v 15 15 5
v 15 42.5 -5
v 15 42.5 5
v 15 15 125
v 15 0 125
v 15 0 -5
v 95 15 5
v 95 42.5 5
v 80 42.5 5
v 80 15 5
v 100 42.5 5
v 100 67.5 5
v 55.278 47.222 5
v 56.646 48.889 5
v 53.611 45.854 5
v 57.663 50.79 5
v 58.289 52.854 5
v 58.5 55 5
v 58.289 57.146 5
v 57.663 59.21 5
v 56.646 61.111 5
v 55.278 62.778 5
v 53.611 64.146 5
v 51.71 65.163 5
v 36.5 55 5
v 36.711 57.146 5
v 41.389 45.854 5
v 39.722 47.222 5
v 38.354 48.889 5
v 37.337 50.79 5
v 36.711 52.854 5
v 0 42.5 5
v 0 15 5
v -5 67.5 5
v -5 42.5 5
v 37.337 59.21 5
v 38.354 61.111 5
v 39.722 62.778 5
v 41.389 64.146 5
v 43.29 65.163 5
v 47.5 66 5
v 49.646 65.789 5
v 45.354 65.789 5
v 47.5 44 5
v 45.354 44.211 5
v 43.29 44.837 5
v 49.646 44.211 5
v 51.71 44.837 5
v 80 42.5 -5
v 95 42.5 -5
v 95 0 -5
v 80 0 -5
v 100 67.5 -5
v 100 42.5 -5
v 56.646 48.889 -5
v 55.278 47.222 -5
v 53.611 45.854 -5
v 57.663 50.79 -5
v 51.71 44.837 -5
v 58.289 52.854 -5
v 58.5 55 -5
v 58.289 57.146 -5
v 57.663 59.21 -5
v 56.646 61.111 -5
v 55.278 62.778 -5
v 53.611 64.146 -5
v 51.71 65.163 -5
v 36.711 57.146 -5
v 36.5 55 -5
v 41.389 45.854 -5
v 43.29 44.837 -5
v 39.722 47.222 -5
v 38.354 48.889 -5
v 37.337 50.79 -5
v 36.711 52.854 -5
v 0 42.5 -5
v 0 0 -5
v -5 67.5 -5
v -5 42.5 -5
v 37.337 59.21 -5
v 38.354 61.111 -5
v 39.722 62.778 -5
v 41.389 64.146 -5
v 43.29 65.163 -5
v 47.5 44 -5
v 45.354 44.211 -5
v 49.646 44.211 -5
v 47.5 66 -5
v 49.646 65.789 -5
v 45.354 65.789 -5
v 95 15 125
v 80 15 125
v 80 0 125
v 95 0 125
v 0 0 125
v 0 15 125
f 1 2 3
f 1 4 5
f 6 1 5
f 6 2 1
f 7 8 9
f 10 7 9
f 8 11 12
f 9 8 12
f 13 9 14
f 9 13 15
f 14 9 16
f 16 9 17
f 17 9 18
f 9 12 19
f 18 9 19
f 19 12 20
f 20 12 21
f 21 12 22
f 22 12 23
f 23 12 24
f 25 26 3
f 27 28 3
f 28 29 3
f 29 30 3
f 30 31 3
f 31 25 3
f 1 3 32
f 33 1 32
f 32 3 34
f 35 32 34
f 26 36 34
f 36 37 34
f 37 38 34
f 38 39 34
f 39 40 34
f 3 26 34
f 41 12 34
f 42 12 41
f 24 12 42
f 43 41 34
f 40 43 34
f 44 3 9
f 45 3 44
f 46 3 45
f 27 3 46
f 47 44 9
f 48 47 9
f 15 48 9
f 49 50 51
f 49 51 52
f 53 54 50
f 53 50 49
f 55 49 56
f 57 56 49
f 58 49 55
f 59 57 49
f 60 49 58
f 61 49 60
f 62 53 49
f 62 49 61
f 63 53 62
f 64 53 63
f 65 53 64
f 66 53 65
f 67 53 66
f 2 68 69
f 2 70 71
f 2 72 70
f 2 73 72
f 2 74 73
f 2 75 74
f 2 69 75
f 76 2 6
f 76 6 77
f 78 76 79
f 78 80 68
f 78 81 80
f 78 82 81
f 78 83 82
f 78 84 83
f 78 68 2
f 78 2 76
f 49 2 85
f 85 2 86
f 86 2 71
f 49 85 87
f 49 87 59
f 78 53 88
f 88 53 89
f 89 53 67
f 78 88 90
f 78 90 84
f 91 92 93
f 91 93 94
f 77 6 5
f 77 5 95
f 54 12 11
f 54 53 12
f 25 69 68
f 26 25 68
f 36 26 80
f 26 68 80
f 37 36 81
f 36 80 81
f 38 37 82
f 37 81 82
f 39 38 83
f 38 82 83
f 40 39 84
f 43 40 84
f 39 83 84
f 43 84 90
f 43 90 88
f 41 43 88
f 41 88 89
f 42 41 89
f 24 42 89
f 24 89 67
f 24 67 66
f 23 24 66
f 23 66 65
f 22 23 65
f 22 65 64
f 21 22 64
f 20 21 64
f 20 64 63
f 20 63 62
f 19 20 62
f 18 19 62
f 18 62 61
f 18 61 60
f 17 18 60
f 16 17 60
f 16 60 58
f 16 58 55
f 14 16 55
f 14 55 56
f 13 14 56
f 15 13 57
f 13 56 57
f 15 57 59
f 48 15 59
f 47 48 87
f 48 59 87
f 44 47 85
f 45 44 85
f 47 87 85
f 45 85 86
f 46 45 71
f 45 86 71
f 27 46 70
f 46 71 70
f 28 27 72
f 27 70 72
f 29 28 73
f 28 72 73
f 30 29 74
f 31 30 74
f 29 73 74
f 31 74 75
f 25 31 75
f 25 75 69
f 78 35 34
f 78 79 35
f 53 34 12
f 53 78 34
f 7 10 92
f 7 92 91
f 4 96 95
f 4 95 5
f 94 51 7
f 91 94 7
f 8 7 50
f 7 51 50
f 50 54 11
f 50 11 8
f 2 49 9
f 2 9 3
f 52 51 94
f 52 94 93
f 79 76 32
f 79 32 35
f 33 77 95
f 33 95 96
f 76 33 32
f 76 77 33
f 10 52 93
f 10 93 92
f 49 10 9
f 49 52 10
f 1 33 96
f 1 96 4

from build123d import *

# Parameters (mm, degrees)
IZIM1_W                       = 15
IZIM1_H                       = 15
Y_KSEKLIK_EKSTR_ZYON1_DEPTH   = 125
Y_KSEKLIK_EKSTR_ZYON1_2_DEPTH = 125
Y_KSEKLIK_EKSTR_ZYON4_DEPTH   = 5
Y_KSEKLIK_EKSTR_ZYON5_REACH   = 179.359
IZIM6_W                       = 15
IZIM6_H                       = 15
IZIM7_R                       = 11
KES_EKSTR_ZYON2_DEPTH         = 53


with BuildPart() as part:
    # Çizim1 → Yükseklik-Ekstrüzyon1 (new body)
    with BuildSketch(Plane.XY):
        with Locations((7.5, 7.5)):
            Rectangle(IZIM1_W, IZIM1_H)
    extrude(amount=Y_KSEKLIK_EKSTR_ZYON1_DEPTH)



with BuildPart() as body_2:
    # Çizim1 → Y_kseklik-Ekstr_zyon1 2 (new body)
    with BuildSketch(Plane.XY):
        with Locations((87.5, 7.5)):
            Rectangle(IZIM1_W, IZIM1_H)
    extrude(amount=Y_KSEKLIK_EKSTR_ZYON1_2_DEPTH)


with BuildPart() as part_1:
    add(part.part)

    add(body_2.part)  # Yükseklik-Ekstrüzyon4 merges body 2
    # Çizim3 → Yükseklik-Ekstrüzyon4 (add, symmetric)
    with BuildSketch(Plane(origin=(0, 0, 0), x_dir=(-1, 0, 0), z_dir=(0, 0, -1))):
        Polygon((-95, 67.5), (-100, 67.5), (-100, 42.5), (-95, 42.5), (-95, 15), (-80, 15), (-80, 42.5), (-15, 42.5), (-15, 0), (0, 0), (0, 42.5), (5, 42.5), (5, 67.5), (0, 67.5), (-15, 67.5), (-80, 67.5), align=None)
    extrude(amount=Y_KSEKLIK_EKSTR_ZYON4_DEPTH, both=True)

    # Çizim6 → Yükseklik-Ekstrüzyon5 (add, up to next)
    with BuildSketch(Plane(origin=(0, 0, -5), x_dir=(-1, 0, 0), z_dir=(0, 0, -1)), mode=Mode.PRIVATE) as y_kseklik_ekstr_zyon5_sk1:
        with Locations((-87.5, 7.5)):
            Rectangle(IZIM6_W, IZIM6_H)
    y_kseklik_ekstr_zyon5_tool1 = extrude(y_kseklik_ekstr_zyon5_sk1.sketch, amount=-Y_KSEKLIK_EKSTR_ZYON5_REACH, mode=Mode.PRIVATE) - part_1.part
    add(y_kseklik_ekstr_zyon5_tool1.solids().sort_by_distance((87.5, 7.5, -5))[0])

    # Çizim7 → Kes-Ekstrüzyon2 (cut)
    with BuildSketch(Plane(origin=(0, 0, -5), x_dir=(-1, 0, 0), z_dir=(0, 0, -1))):
        with Locations((-47.5, 55)):
            Circle(IZIM7_R)
    extrude(amount=-KES_EKSTR_ZYON2_DEPTH, mode=Mode.SUBTRACT)


solid = part_1.part
